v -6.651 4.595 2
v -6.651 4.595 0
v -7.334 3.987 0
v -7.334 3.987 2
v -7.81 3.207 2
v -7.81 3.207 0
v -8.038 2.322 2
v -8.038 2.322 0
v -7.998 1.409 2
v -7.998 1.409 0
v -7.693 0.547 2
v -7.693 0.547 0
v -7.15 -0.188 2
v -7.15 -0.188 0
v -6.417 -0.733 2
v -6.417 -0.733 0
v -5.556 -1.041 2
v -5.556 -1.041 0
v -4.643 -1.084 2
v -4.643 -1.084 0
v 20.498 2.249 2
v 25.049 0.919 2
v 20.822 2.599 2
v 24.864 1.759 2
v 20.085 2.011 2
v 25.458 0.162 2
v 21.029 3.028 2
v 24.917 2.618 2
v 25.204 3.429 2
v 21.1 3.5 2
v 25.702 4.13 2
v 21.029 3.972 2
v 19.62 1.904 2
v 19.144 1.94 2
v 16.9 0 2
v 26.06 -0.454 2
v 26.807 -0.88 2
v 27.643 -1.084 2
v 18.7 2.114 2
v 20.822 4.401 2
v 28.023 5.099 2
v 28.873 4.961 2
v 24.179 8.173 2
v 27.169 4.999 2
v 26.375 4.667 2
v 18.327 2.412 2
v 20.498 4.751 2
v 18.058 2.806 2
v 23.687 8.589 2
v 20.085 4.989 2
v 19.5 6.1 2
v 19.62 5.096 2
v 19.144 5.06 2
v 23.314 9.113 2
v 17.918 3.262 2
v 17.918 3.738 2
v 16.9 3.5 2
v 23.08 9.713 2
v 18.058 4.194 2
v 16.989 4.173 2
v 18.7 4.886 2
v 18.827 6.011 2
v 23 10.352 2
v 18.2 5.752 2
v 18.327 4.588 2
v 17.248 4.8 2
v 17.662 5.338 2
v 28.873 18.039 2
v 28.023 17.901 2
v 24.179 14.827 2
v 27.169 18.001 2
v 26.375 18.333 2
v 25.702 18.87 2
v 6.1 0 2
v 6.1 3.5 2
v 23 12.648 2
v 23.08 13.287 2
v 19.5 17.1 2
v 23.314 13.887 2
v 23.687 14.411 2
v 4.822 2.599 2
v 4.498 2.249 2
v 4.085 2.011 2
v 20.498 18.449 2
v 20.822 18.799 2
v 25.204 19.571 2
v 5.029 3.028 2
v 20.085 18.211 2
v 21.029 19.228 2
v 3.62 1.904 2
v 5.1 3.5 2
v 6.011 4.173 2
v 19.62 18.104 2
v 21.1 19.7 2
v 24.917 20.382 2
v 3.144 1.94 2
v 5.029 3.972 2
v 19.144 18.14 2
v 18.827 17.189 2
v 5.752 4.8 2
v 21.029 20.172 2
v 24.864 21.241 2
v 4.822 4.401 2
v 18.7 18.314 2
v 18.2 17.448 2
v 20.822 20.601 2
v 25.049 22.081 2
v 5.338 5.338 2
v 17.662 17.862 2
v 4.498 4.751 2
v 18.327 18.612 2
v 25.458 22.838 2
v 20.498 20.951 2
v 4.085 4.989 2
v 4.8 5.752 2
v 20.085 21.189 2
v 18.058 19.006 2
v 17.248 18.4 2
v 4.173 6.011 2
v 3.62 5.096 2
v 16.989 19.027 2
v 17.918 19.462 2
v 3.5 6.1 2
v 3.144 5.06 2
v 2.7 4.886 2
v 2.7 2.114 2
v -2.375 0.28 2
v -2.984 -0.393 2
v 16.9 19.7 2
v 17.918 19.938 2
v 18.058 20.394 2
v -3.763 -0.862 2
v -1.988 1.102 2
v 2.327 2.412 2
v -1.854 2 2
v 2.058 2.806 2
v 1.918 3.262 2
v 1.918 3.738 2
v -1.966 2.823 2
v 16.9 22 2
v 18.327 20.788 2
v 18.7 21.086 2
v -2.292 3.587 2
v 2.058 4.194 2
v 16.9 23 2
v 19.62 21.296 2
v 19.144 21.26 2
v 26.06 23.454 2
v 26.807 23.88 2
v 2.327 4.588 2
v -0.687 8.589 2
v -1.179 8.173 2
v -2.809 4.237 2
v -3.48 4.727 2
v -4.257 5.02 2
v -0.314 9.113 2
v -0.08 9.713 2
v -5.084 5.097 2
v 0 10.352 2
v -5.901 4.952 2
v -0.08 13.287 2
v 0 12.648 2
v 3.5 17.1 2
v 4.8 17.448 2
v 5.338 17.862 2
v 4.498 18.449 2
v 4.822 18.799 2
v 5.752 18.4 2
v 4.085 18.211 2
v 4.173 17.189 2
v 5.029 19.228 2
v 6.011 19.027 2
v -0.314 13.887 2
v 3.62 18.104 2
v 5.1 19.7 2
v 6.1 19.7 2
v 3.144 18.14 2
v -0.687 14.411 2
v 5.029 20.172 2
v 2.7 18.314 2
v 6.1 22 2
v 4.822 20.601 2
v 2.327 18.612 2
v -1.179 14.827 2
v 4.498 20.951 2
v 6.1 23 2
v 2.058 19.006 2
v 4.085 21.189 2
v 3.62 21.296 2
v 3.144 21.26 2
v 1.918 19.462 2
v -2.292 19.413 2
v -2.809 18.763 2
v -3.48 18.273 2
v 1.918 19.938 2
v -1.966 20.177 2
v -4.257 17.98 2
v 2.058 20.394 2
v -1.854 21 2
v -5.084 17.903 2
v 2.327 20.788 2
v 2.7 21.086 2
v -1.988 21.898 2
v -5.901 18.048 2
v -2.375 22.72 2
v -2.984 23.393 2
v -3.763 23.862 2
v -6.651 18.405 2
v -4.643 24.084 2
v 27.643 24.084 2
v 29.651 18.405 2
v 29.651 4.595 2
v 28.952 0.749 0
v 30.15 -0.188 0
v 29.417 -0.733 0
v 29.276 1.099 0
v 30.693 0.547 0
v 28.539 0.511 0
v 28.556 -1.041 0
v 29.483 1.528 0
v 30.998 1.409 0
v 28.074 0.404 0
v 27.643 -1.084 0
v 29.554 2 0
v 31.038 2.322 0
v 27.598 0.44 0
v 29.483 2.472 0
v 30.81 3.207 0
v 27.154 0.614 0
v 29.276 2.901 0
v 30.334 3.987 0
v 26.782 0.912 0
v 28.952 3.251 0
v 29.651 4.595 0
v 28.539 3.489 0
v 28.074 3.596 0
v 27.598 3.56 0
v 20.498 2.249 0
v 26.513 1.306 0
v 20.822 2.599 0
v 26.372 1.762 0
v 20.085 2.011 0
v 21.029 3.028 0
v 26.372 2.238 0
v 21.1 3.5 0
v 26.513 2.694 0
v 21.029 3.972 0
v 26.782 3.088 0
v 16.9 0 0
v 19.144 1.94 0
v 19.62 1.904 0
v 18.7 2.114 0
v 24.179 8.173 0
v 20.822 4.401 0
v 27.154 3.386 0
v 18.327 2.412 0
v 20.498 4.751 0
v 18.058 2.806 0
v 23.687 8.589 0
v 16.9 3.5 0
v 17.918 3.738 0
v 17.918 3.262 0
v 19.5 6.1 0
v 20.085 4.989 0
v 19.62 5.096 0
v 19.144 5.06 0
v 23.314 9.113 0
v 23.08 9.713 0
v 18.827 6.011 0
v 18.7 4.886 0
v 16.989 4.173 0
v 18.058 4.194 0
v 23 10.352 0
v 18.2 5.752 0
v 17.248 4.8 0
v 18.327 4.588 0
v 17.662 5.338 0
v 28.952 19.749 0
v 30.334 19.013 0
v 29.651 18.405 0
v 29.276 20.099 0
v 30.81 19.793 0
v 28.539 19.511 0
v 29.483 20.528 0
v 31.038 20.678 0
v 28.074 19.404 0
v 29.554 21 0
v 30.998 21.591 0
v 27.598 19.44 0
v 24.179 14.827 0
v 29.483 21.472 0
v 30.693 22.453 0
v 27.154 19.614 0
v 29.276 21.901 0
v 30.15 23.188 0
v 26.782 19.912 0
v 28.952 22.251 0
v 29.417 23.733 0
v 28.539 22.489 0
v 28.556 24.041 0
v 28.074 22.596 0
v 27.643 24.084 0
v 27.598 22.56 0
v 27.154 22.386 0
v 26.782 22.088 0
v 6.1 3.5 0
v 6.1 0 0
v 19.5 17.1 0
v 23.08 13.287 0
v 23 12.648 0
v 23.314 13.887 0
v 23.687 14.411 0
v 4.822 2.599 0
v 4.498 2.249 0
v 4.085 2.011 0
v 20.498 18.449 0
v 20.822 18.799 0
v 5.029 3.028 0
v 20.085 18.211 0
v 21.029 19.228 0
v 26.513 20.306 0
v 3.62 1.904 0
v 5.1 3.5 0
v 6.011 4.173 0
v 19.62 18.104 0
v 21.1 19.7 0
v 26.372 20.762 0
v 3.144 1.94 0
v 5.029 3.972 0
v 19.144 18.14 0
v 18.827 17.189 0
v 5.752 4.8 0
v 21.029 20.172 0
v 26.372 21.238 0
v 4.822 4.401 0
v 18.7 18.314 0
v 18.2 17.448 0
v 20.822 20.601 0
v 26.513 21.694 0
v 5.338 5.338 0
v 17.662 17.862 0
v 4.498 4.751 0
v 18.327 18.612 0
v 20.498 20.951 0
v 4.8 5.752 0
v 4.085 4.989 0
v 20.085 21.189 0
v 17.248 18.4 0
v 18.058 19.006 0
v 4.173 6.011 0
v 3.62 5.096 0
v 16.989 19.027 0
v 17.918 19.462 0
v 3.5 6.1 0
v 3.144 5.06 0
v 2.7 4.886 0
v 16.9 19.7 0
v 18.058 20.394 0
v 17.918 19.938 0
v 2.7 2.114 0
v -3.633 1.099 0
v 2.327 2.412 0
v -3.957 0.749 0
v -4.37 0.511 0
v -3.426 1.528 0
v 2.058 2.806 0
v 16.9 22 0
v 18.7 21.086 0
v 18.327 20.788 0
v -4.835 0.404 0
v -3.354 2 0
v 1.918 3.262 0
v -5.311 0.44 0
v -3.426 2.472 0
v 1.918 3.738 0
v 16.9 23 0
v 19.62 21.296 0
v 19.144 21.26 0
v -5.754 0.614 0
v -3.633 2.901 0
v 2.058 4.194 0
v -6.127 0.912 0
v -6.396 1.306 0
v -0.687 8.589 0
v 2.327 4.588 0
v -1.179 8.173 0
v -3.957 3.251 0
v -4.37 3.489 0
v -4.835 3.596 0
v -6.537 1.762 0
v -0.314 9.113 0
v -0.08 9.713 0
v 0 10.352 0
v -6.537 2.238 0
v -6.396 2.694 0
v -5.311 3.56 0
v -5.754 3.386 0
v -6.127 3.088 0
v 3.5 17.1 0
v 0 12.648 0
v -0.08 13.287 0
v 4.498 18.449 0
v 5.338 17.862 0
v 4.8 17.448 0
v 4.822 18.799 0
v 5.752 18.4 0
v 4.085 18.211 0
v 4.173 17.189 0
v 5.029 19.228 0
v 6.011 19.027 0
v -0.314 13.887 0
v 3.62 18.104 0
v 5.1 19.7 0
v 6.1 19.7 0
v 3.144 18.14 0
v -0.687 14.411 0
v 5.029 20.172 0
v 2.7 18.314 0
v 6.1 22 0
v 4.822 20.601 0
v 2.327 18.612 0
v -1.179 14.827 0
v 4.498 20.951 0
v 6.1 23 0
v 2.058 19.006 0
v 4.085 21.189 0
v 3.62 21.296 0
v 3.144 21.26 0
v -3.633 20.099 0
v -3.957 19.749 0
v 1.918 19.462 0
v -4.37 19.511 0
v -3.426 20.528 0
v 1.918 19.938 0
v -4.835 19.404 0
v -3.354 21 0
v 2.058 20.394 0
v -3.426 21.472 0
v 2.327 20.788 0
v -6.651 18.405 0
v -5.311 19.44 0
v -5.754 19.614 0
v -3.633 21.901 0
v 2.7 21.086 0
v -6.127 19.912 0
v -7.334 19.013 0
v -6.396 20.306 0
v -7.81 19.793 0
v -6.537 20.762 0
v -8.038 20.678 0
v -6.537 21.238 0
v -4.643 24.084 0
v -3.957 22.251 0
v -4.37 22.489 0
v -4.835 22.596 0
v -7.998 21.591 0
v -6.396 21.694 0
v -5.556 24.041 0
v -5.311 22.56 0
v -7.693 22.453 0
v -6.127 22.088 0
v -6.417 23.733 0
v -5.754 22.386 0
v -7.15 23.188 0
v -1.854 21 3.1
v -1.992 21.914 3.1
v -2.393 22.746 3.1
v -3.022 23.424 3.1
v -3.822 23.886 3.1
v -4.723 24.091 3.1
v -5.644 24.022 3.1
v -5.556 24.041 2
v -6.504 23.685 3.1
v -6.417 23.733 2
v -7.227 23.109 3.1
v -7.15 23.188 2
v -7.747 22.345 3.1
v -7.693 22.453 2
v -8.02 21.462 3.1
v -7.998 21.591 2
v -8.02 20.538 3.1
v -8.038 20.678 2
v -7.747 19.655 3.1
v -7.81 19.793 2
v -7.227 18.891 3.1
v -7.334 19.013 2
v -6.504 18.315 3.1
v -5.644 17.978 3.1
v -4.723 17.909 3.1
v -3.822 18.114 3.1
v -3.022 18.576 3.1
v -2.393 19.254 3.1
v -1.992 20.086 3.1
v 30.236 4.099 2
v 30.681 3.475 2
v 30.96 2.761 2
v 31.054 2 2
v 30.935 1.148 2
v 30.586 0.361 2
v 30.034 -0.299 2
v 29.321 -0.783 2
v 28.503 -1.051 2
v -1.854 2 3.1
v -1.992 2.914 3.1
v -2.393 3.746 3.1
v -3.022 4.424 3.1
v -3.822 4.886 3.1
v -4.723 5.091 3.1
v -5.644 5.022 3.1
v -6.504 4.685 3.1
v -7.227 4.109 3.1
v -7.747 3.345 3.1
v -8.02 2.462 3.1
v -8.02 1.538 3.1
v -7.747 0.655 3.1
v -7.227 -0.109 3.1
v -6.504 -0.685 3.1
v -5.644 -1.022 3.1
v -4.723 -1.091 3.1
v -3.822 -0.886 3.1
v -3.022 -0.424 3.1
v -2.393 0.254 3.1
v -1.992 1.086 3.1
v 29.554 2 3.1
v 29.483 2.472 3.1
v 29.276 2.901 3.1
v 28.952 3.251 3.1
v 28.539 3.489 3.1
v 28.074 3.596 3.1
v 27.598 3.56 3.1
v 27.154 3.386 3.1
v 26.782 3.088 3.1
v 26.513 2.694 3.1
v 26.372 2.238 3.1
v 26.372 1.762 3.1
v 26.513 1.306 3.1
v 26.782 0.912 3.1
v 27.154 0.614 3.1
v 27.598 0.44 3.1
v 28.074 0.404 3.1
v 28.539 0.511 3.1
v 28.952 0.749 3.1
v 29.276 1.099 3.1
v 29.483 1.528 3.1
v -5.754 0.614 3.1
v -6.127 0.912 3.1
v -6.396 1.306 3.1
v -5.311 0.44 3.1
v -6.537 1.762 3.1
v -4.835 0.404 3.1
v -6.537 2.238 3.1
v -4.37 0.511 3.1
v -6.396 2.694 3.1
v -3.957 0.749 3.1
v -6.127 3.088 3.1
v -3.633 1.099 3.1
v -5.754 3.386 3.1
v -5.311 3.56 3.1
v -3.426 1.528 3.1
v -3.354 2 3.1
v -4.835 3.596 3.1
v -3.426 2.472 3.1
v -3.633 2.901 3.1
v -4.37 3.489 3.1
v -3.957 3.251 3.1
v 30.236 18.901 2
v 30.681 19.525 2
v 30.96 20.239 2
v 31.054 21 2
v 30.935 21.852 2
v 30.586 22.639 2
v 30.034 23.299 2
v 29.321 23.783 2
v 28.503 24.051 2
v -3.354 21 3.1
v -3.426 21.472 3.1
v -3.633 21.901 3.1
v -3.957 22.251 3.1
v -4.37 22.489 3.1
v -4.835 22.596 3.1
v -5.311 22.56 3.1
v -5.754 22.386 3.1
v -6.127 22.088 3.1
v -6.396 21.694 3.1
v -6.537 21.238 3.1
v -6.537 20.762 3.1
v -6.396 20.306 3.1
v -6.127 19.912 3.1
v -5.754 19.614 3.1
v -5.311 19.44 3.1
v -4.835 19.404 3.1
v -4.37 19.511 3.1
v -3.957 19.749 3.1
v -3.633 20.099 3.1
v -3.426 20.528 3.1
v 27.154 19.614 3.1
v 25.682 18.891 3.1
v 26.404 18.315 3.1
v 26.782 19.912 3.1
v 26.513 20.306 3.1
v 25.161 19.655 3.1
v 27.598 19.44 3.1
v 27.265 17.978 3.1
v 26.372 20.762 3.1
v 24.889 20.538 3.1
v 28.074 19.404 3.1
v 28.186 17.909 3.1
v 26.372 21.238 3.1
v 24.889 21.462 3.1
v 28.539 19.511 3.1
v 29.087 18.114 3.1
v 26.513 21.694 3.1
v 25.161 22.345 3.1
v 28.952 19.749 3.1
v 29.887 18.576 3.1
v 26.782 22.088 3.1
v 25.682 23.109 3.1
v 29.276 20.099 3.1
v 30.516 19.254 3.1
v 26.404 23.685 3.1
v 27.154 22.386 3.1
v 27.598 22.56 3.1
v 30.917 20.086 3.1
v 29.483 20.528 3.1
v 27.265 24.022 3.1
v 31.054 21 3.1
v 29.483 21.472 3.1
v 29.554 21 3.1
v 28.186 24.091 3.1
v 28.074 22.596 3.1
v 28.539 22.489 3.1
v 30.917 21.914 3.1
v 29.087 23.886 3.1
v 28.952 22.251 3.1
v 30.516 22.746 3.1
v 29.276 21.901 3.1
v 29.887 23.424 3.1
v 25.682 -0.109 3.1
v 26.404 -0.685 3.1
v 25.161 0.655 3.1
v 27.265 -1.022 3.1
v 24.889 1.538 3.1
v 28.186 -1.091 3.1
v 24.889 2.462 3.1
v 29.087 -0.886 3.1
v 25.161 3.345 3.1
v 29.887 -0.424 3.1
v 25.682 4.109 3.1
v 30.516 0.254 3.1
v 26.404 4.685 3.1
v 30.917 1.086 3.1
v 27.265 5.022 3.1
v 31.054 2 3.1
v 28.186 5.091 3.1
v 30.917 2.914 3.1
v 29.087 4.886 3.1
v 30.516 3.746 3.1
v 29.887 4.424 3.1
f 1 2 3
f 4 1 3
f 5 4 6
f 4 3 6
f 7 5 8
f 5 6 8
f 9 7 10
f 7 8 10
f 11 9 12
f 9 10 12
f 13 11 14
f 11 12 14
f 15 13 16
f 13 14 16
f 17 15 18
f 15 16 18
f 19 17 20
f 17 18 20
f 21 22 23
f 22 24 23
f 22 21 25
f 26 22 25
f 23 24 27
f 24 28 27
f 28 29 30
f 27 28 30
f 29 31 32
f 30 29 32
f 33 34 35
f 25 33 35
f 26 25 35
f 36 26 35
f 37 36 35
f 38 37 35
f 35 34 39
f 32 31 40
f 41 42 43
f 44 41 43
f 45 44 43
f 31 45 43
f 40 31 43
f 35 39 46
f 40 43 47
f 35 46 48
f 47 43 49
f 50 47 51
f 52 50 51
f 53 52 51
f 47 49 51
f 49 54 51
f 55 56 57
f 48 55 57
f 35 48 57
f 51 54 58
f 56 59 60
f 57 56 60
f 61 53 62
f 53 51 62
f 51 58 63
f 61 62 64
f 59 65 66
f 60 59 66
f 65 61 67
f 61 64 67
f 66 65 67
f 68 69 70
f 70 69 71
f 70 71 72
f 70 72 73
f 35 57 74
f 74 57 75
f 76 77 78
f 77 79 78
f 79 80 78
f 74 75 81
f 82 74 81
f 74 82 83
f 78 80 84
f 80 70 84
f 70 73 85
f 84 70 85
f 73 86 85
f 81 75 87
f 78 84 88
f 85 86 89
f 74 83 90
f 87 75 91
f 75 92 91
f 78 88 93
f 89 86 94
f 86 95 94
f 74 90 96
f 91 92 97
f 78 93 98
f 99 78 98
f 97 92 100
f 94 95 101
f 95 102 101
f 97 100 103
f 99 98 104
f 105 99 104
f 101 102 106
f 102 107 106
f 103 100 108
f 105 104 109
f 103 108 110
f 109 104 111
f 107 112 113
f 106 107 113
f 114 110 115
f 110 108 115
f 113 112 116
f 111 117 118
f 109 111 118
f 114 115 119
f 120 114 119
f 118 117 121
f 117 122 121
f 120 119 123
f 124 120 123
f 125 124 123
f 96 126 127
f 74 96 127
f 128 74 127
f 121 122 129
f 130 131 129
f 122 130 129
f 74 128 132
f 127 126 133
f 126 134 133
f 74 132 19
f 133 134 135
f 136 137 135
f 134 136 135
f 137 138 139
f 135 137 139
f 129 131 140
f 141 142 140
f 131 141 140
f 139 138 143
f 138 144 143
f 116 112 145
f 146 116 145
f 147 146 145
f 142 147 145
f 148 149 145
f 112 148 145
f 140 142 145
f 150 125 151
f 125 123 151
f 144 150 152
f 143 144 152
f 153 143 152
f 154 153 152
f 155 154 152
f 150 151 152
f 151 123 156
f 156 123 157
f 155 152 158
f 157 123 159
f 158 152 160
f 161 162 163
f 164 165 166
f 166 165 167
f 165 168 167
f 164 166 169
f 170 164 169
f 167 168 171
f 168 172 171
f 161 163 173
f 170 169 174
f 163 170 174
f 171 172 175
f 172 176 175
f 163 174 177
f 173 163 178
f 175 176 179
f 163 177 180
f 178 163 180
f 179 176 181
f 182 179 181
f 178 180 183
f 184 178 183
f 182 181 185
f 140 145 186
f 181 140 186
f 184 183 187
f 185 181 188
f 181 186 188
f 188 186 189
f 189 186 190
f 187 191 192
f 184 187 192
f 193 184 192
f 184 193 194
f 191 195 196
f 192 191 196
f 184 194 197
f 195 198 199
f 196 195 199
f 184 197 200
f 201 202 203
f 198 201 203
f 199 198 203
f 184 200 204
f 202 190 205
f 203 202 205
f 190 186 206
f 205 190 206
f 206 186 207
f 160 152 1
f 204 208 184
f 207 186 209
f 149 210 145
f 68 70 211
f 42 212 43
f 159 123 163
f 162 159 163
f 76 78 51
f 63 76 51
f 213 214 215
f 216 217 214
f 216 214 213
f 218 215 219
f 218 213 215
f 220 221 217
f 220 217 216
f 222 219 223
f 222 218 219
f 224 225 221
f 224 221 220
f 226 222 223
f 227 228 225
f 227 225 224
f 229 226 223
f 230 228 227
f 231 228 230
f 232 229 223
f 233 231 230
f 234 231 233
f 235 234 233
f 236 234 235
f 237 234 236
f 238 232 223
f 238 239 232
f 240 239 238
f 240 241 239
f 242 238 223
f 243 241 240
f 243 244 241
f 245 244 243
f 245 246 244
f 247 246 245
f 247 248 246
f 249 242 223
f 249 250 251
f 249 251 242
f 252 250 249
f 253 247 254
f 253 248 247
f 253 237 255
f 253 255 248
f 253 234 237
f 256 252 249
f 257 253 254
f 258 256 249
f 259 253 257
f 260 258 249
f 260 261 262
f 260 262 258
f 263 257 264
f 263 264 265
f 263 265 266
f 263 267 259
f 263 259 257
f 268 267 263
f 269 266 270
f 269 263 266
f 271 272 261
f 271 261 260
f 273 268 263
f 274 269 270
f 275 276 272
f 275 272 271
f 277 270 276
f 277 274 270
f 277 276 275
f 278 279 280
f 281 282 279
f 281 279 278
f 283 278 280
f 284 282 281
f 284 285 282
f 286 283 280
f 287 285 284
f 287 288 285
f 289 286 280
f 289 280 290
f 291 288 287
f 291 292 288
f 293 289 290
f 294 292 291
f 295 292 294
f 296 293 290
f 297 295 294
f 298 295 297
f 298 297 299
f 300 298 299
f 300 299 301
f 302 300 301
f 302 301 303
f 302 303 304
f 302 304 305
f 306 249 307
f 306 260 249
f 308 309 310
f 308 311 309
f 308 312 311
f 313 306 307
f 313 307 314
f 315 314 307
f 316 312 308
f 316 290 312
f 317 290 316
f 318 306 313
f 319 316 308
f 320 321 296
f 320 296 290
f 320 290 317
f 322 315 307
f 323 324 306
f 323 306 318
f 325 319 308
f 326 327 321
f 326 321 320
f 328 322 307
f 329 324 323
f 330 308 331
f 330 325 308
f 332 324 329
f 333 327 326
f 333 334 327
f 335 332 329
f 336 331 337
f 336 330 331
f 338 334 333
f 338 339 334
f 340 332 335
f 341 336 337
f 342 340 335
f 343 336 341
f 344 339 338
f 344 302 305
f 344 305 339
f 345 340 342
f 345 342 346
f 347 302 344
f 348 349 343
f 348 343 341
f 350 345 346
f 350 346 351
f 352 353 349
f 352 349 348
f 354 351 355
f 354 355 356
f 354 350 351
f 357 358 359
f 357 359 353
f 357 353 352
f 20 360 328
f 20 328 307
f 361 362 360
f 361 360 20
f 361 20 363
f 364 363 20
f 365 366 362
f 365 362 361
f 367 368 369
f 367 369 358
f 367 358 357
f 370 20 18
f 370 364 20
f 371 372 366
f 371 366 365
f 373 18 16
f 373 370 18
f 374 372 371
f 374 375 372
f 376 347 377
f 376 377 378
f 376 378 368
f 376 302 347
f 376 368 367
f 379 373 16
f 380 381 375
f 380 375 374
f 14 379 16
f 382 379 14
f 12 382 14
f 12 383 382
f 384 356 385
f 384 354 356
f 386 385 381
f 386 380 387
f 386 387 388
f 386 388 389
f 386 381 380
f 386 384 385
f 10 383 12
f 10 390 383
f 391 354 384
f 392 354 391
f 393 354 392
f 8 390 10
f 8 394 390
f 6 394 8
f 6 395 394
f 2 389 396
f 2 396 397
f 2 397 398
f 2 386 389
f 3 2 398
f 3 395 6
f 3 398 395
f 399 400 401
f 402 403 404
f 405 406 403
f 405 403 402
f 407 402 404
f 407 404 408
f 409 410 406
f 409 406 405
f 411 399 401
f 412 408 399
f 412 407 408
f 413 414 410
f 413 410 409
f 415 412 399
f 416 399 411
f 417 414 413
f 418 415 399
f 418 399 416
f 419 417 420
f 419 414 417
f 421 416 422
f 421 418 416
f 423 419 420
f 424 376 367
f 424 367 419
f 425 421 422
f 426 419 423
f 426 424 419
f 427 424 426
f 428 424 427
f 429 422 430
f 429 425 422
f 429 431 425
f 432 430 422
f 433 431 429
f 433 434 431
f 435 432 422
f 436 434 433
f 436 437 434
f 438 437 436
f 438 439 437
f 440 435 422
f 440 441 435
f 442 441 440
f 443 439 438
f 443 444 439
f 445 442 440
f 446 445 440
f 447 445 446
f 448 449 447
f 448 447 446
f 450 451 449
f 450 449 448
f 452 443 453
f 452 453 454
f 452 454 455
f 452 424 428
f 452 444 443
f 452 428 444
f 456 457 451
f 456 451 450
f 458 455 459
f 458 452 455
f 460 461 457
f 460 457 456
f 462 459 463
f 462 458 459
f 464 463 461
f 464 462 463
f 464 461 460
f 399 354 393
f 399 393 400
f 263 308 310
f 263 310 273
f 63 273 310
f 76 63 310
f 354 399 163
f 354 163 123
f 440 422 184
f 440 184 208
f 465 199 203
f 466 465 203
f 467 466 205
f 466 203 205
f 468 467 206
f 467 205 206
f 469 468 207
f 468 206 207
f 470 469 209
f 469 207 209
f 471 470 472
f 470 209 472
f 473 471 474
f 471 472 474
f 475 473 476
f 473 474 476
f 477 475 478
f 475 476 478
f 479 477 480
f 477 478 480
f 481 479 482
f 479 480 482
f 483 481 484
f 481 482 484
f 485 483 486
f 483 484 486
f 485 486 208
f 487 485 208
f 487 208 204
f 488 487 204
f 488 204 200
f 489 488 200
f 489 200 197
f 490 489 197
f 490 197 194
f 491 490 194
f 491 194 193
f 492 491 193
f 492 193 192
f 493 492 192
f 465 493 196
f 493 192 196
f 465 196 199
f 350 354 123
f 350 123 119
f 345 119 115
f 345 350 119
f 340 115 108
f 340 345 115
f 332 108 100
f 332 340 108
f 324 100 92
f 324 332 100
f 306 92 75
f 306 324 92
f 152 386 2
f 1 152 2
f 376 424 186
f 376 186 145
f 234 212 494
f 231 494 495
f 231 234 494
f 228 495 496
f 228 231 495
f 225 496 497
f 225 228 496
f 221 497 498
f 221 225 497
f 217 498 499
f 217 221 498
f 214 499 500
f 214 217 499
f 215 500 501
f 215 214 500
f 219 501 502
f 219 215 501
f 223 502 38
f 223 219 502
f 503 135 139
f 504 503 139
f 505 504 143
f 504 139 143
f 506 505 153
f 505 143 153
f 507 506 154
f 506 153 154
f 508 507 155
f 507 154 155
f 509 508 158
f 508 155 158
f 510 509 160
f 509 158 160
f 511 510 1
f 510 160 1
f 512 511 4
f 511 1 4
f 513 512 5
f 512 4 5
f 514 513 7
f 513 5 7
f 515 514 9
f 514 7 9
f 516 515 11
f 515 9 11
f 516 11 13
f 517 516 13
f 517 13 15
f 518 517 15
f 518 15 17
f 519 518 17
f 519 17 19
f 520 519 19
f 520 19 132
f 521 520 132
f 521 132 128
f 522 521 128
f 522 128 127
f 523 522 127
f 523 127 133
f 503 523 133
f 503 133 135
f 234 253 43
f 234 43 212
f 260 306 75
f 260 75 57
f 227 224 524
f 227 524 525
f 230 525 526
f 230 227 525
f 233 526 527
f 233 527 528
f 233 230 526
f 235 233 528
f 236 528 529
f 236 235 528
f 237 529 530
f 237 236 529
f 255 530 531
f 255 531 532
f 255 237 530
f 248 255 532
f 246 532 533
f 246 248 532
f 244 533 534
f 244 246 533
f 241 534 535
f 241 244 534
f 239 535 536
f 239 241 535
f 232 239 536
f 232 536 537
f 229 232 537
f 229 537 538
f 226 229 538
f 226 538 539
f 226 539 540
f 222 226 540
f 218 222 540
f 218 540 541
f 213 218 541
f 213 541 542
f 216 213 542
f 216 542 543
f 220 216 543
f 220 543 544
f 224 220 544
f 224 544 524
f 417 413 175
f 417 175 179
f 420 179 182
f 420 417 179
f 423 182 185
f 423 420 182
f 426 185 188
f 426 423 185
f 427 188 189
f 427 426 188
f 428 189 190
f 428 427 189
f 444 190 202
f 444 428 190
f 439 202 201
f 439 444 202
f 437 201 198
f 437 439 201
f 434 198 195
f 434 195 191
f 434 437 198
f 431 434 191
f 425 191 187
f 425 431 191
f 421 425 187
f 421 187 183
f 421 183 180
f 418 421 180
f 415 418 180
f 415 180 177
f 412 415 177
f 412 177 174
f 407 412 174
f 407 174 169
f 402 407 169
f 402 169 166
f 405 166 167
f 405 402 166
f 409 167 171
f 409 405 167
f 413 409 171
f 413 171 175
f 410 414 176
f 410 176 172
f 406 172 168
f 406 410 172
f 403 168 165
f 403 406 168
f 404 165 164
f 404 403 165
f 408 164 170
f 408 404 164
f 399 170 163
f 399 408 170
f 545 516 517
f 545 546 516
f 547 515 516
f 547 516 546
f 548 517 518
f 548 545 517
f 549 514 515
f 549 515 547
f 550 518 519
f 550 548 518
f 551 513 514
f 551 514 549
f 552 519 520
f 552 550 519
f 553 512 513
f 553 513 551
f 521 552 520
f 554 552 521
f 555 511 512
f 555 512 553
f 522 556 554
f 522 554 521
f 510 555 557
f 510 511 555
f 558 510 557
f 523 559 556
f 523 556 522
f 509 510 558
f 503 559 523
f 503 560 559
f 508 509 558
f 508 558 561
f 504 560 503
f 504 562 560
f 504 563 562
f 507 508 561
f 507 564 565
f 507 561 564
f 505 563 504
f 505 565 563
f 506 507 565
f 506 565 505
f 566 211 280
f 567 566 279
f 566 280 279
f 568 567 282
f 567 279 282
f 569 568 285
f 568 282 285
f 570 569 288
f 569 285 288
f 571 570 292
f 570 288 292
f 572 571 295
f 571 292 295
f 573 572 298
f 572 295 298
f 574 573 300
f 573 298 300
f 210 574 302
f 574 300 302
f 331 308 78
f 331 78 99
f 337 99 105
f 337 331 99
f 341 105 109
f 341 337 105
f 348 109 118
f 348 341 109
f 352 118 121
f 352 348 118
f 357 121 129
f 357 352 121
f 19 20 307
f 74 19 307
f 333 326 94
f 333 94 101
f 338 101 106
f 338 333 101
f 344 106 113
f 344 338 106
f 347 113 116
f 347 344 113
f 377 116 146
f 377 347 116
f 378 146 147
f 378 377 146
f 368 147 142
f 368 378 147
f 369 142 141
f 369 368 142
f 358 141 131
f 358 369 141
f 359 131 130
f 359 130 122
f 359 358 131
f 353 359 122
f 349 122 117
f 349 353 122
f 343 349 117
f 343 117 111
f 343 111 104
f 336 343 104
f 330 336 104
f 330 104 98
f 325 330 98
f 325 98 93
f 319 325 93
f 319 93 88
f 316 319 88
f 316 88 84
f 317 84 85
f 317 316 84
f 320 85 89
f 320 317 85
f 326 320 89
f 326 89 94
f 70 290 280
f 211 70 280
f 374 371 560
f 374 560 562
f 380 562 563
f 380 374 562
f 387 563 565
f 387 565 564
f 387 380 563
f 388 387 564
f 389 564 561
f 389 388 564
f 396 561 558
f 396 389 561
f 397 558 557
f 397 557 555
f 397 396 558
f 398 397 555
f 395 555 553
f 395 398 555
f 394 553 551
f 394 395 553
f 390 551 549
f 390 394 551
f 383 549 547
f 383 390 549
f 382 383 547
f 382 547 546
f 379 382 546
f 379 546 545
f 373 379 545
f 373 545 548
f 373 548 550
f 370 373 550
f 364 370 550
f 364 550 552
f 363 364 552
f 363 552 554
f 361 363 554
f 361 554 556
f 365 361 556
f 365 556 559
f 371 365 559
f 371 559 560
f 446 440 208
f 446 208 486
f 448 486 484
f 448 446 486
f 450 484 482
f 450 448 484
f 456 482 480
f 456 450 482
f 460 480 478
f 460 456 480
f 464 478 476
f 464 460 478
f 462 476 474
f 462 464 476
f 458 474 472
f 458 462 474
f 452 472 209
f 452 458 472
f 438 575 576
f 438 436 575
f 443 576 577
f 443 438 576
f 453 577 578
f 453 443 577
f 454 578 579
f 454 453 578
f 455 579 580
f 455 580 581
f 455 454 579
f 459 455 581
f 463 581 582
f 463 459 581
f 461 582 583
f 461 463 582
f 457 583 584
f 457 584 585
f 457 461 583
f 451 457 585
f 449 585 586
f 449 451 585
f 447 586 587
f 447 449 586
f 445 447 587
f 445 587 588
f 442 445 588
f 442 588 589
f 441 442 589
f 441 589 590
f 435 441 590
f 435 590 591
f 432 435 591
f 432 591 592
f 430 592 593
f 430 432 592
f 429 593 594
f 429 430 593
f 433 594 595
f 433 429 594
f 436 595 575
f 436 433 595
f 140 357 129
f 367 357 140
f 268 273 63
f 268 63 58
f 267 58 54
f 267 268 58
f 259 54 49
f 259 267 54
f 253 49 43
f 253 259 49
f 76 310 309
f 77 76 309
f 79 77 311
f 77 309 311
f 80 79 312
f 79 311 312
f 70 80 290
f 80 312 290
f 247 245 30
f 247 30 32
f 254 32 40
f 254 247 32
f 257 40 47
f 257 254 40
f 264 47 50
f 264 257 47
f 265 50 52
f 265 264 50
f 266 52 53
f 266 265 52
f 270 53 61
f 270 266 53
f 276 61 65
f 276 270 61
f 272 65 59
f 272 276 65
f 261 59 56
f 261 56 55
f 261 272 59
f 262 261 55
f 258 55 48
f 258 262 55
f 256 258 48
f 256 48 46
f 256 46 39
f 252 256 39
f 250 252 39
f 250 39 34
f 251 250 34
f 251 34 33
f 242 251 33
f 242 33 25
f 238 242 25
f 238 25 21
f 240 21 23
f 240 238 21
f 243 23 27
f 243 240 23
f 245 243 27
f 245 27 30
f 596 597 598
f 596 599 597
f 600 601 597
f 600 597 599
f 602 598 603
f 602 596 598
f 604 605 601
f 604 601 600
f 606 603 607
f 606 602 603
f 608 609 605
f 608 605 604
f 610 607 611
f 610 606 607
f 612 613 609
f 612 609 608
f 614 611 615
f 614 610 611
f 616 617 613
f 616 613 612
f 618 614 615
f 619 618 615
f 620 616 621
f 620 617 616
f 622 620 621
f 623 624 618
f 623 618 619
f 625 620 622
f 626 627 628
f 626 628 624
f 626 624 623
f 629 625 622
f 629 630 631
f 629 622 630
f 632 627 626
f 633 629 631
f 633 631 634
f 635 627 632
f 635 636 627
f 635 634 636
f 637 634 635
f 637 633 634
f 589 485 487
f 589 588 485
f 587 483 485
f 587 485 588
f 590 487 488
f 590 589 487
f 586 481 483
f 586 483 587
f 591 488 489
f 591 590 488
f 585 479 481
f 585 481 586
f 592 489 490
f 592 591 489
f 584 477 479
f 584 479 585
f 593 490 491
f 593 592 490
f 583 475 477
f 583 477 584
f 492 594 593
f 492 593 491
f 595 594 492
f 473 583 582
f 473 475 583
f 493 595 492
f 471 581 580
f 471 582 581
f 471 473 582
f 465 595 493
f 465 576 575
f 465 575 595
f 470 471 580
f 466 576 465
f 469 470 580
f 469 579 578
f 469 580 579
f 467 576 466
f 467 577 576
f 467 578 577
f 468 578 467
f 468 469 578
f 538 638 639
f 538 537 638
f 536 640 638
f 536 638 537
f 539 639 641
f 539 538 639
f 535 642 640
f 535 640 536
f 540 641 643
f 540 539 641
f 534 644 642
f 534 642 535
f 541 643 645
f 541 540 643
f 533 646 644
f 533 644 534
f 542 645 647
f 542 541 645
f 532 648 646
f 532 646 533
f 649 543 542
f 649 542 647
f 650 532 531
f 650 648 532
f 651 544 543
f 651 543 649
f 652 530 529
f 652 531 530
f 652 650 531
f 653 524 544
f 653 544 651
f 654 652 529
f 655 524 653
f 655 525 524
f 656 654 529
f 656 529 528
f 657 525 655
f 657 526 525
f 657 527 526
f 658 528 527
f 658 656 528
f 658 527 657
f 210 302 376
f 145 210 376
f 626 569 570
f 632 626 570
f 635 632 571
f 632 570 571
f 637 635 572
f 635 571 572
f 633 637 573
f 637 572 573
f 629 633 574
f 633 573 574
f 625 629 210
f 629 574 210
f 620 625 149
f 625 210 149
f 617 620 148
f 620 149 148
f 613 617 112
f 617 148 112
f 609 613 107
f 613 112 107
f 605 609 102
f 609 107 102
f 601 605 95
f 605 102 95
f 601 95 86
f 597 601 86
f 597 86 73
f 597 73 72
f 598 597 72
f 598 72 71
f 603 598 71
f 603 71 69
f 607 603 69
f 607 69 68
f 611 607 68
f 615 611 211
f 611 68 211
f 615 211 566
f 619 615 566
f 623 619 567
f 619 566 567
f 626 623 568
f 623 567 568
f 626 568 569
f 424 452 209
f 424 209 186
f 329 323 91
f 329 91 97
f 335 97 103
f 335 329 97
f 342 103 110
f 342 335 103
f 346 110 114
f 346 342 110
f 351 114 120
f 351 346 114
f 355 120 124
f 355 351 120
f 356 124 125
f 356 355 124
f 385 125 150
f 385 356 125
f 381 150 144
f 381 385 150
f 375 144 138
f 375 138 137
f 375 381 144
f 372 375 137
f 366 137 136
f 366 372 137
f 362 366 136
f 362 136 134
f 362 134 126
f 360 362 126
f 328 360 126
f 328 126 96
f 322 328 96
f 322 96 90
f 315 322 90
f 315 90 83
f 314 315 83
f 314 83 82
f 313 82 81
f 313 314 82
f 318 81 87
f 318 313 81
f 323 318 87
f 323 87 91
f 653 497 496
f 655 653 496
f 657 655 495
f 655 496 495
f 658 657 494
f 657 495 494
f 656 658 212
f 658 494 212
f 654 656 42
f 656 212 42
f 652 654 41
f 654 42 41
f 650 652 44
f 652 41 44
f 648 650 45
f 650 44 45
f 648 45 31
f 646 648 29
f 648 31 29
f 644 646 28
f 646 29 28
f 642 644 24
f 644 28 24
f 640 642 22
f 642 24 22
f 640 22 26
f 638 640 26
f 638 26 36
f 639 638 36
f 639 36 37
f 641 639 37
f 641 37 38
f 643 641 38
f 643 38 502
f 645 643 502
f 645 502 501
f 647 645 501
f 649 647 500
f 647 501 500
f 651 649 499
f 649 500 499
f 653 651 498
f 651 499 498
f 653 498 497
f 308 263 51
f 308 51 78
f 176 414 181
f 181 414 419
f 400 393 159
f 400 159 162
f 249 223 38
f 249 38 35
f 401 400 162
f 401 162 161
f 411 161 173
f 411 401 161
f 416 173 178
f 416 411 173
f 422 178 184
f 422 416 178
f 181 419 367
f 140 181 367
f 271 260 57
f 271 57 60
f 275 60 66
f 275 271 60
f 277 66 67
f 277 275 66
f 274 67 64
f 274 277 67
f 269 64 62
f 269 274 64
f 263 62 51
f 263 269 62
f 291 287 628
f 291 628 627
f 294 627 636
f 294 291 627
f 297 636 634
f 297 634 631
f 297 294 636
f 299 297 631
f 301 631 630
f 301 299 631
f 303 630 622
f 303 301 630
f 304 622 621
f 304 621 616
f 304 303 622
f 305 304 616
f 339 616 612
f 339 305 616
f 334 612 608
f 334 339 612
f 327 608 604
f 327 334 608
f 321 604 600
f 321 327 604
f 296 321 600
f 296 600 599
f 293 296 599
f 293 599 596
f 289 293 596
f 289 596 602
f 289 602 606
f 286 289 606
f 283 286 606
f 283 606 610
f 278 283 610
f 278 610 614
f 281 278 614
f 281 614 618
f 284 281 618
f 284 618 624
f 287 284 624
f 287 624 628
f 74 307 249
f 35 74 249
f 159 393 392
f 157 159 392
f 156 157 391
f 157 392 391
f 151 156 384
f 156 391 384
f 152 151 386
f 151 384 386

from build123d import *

# Parameters (mm, degrees)
SKETCH1_W             = 23
SKETCH1_H             = 23
BOSS_EXTRUDE1_DEPTH   = 2
FILLET1_R             = 2
SKETCH2_R             = 1.6
CUT_EXTRUDE1_DEPTH    = 2
SKETCH3_W             = 10.8
SKETCH3_H             = 2.3
CUT_EXTRUDE2_DEPTH    = 2
SKETCH5_R             = 1.6
BOSS_EXTRUDE2_DEPTH   = 2
BOSS_EXTRUDE2_2_DEPTH = 2
BOSS_EXTRUDE2_3_DEPTH = 2
BOSS_EXTRUDE2_4_DEPTH = 2
BOSS_EXTRUDE3_START   = 2
SKETCH6_R             = 3.1
SKETCH6_R_2           = 1.6
BOSS_EXTRUDE3_DEPTH   = 1.1


with BuildPart() as part:
    # Sketch1 → Boss-Extrude1 (new body)
    with BuildSketch(Plane.XY):
        with Locations((11.5, 11.5)):
            Rectangle(SKETCH1_W, SKETCH1_H)
    extrude(amount=BOSS_EXTRUDE1_DEPTH)

    # Fillet1
    fillet1_edges = [part.edges().sort_by_distance(p)[0] for p in [
        (0, 23, 1),
        (23, 23, 1),
        (23, 0, 1),
        (0, 0, 1),
    ]]
    fillet(fillet1_edges, radius=FILLET1_R)

    # Sketch2 → Cut-Extrude1 (cut)
    with BuildSketch(Plane.XY):
        with Locations((3.5, 19.7)):
            Circle(SKETCH2_R)
        with Locations((19.5, 19.7)):
            Circle(SKETCH2_R)
        with Locations((19.5, 3.5)):
            Circle(SKETCH2_R)
        with Locations((3.5, 3.5)):
            Circle(SKETCH2_R)
        with BuildLine():
            Line((3.5, 17.1), (3.5, 6.1))
            ThreePointArc((3.5, 6.1), (5.338477631, 5.338477631), (6.1, 3.5))
            Line((6.1, 3.5), (16.9, 3.5))
            ThreePointArc((16.9, 3.5), (17.661522369, 5.338477631), (19.5, 6.1))
            Line((19.5, 6.1), (19.5, 17.1))
            ThreePointArc((19.5, 17.1), (17.661522369, 17.861522369), (16.9, 19.7))
            Line((16.9, 19.7), (6.1, 19.7))
            ThreePointArc((6.1, 19.7), (5.338477631, 17.861522369), (3.5, 17.1))
        make_face()
    extrude(amount=CUT_EXTRUDE1_DEPTH, mode=Mode.SUBTRACT)

    # Sketch3 → Cut-Extrude2 (cut)
    with BuildSketch(Plane.XY):
        with Locations((11.5, 20.85)):
            Rectangle(SKETCH3_W, SKETCH3_H)
    extrude(amount=CUT_EXTRUDE2_DEPTH, mode=Mode.SUBTRACT)


with BuildPart() as body_2:
    # Sketch5 → Boss-Extrude2 (new body)
    with BuildSketch(Plane.XY):
        with BuildLine():
            Line((16.9, 23), (21.776453683, 21.561960094))
            Line((21.776453683, 21.561960094), (23, 12.648059803))
            ThreePointArc((23, 12.648059803), (23.313519219, 13.886650017), (24.17856315, 14.826915413))
            Line((24.17856315, 14.826915413), (29.65108056, 18.405475842))
            ThreePointArc((29.65108056, 18.405475842), (30.877170115, 22.033391556), (27.643175365, 24.084329386))
            Line((27.643175365, 24.084329386), (16.9, 23))
        make_face()
        with Locations((27.954482672, 21)):
            Circle(SKETCH5_R, mode=Mode.SUBTRACT)
    extrude(amount=BOSS_EXTRUDE2_DEPTH)


with BuildPart() as body_3:
    # Sketch5 → Boss-Extrude2 2 (new body)
    with BuildSketch(Plane.XY):
        with BuildLine():
            Line((-4.643175365, 24.084329386), (6.1, 23))
            Line((6.1, 23), (1.223546317, 21.561960094))
            Line((1.223546317, 21.561960094), (0, 12.648059803))
            ThreePointArc((0, 12.648059803), (-0.313519219, 13.886650017), (-1.17856315, 14.826915413))
            Line((-1.17856315, 14.826915413), (-6.65108056, 18.405475842))
            ThreePointArc((-6.65108056, 18.405475842), (-7.877170115, 22.033391556), (-4.643175365, 24.084329386))
        make_face()
        with Locations((-4.954482672, 21)):
            Circle(SKETCH5_R, mode=Mode.SUBTRACT)
    extrude(amount=BOSS_EXTRUDE2_2_DEPTH)


with BuildPart() as body_4:
    # Sketch5 → Boss-Extrude2 3 (new body)
    with BuildSketch(Plane.XY):
        with BuildLine():
            Line((16.9, 0), (21.776453683, 1.438039906))
            Line((21.776453683, 1.438039906), (23, 10.351940197))
            ThreePointArc((23, 10.351940197), (23.313519219, 9.113349983), (24.17856315, 8.173084587))
            Line((24.17856315, 8.173084587), (29.65108056, 4.594524158))
            ThreePointArc((29.65108056, 4.594524158), (30.877170115, 0.966608444), (27.643175365, -1.084329386))
            Line((27.643175365, -1.084329386), (16.9, 0))
        make_face()
        with Locations((27.954482672, 2)):
            Circle(SKETCH5_R, mode=Mode.SUBTRACT)
    extrude(amount=BOSS_EXTRUDE2_3_DEPTH)


with BuildPart() as body_5:
    # Sketch5 → Boss-Extrude2 4 (new body)
    with BuildSketch(Plane.XY):
        with BuildLine():
            Line((6.1, 0), (1.223546317, 1.438039906))
            Line((1.223546317, 1.438039906), (0, 10.351940197))
            ThreePointArc((0, 10.351940197), (-0.313519219, 9.113349983), (-1.17856315, 8.173084587))
            Line((-1.17856315, 8.173084587), (-6.65108056, 4.594524158))
            ThreePointArc((-6.65108056, 4.594524158), (-7.877170115, 0.966608444), (-4.643175365, -1.084329386))
            Line((-4.643175365, -1.084329386), (6.1, 0))
        make_face()
        with Locations((-4.954482672, 2)):
            Circle(SKETCH5_R, mode=Mode.SUBTRACT)
    extrude(amount=BOSS_EXTRUDE2_4_DEPTH)

    # Combine1: union part, body 3, body 2, body 4
    add(part.part)
    add(body_3.part)
    add(body_2.part)
    add(body_4.part)

    # Sketch6 → Boss-Extrude3 (add)
    with BuildSketch(Plane.XY.offset(BOSS_EXTRUDE3_START)):
        with Locations((-4.954482672, 21)):
            Circle(SKETCH6_R)
        with Locations((-4.954482672, 21)):
            Circle(SKETCH6_R_2, mode=Mode.SUBTRACT)
        with Locations((-4.954482672, 2)):
            Circle(SKETCH6_R)
        with Locations((-4.954482672, 2)):
            Circle(SKETCH6_R_2, mode=Mode.SUBTRACT)
        with Locations((27.954482672, 2)):
            Circle(SKETCH6_R)
        with Locations((27.954482672, 2)):
            Circle(SKETCH6_R_2, mode=Mode.SUBTRACT)
        with Locations((27.954482672, 21)):
            Circle(SKETCH6_R)
        with Locations((27.954482672, 21)):
            Circle(SKETCH6_R_2, mode=Mode.SUBTRACT)
    extrude(amount=BOSS_EXTRUDE3_DEPTH)


solid = body_5.part
